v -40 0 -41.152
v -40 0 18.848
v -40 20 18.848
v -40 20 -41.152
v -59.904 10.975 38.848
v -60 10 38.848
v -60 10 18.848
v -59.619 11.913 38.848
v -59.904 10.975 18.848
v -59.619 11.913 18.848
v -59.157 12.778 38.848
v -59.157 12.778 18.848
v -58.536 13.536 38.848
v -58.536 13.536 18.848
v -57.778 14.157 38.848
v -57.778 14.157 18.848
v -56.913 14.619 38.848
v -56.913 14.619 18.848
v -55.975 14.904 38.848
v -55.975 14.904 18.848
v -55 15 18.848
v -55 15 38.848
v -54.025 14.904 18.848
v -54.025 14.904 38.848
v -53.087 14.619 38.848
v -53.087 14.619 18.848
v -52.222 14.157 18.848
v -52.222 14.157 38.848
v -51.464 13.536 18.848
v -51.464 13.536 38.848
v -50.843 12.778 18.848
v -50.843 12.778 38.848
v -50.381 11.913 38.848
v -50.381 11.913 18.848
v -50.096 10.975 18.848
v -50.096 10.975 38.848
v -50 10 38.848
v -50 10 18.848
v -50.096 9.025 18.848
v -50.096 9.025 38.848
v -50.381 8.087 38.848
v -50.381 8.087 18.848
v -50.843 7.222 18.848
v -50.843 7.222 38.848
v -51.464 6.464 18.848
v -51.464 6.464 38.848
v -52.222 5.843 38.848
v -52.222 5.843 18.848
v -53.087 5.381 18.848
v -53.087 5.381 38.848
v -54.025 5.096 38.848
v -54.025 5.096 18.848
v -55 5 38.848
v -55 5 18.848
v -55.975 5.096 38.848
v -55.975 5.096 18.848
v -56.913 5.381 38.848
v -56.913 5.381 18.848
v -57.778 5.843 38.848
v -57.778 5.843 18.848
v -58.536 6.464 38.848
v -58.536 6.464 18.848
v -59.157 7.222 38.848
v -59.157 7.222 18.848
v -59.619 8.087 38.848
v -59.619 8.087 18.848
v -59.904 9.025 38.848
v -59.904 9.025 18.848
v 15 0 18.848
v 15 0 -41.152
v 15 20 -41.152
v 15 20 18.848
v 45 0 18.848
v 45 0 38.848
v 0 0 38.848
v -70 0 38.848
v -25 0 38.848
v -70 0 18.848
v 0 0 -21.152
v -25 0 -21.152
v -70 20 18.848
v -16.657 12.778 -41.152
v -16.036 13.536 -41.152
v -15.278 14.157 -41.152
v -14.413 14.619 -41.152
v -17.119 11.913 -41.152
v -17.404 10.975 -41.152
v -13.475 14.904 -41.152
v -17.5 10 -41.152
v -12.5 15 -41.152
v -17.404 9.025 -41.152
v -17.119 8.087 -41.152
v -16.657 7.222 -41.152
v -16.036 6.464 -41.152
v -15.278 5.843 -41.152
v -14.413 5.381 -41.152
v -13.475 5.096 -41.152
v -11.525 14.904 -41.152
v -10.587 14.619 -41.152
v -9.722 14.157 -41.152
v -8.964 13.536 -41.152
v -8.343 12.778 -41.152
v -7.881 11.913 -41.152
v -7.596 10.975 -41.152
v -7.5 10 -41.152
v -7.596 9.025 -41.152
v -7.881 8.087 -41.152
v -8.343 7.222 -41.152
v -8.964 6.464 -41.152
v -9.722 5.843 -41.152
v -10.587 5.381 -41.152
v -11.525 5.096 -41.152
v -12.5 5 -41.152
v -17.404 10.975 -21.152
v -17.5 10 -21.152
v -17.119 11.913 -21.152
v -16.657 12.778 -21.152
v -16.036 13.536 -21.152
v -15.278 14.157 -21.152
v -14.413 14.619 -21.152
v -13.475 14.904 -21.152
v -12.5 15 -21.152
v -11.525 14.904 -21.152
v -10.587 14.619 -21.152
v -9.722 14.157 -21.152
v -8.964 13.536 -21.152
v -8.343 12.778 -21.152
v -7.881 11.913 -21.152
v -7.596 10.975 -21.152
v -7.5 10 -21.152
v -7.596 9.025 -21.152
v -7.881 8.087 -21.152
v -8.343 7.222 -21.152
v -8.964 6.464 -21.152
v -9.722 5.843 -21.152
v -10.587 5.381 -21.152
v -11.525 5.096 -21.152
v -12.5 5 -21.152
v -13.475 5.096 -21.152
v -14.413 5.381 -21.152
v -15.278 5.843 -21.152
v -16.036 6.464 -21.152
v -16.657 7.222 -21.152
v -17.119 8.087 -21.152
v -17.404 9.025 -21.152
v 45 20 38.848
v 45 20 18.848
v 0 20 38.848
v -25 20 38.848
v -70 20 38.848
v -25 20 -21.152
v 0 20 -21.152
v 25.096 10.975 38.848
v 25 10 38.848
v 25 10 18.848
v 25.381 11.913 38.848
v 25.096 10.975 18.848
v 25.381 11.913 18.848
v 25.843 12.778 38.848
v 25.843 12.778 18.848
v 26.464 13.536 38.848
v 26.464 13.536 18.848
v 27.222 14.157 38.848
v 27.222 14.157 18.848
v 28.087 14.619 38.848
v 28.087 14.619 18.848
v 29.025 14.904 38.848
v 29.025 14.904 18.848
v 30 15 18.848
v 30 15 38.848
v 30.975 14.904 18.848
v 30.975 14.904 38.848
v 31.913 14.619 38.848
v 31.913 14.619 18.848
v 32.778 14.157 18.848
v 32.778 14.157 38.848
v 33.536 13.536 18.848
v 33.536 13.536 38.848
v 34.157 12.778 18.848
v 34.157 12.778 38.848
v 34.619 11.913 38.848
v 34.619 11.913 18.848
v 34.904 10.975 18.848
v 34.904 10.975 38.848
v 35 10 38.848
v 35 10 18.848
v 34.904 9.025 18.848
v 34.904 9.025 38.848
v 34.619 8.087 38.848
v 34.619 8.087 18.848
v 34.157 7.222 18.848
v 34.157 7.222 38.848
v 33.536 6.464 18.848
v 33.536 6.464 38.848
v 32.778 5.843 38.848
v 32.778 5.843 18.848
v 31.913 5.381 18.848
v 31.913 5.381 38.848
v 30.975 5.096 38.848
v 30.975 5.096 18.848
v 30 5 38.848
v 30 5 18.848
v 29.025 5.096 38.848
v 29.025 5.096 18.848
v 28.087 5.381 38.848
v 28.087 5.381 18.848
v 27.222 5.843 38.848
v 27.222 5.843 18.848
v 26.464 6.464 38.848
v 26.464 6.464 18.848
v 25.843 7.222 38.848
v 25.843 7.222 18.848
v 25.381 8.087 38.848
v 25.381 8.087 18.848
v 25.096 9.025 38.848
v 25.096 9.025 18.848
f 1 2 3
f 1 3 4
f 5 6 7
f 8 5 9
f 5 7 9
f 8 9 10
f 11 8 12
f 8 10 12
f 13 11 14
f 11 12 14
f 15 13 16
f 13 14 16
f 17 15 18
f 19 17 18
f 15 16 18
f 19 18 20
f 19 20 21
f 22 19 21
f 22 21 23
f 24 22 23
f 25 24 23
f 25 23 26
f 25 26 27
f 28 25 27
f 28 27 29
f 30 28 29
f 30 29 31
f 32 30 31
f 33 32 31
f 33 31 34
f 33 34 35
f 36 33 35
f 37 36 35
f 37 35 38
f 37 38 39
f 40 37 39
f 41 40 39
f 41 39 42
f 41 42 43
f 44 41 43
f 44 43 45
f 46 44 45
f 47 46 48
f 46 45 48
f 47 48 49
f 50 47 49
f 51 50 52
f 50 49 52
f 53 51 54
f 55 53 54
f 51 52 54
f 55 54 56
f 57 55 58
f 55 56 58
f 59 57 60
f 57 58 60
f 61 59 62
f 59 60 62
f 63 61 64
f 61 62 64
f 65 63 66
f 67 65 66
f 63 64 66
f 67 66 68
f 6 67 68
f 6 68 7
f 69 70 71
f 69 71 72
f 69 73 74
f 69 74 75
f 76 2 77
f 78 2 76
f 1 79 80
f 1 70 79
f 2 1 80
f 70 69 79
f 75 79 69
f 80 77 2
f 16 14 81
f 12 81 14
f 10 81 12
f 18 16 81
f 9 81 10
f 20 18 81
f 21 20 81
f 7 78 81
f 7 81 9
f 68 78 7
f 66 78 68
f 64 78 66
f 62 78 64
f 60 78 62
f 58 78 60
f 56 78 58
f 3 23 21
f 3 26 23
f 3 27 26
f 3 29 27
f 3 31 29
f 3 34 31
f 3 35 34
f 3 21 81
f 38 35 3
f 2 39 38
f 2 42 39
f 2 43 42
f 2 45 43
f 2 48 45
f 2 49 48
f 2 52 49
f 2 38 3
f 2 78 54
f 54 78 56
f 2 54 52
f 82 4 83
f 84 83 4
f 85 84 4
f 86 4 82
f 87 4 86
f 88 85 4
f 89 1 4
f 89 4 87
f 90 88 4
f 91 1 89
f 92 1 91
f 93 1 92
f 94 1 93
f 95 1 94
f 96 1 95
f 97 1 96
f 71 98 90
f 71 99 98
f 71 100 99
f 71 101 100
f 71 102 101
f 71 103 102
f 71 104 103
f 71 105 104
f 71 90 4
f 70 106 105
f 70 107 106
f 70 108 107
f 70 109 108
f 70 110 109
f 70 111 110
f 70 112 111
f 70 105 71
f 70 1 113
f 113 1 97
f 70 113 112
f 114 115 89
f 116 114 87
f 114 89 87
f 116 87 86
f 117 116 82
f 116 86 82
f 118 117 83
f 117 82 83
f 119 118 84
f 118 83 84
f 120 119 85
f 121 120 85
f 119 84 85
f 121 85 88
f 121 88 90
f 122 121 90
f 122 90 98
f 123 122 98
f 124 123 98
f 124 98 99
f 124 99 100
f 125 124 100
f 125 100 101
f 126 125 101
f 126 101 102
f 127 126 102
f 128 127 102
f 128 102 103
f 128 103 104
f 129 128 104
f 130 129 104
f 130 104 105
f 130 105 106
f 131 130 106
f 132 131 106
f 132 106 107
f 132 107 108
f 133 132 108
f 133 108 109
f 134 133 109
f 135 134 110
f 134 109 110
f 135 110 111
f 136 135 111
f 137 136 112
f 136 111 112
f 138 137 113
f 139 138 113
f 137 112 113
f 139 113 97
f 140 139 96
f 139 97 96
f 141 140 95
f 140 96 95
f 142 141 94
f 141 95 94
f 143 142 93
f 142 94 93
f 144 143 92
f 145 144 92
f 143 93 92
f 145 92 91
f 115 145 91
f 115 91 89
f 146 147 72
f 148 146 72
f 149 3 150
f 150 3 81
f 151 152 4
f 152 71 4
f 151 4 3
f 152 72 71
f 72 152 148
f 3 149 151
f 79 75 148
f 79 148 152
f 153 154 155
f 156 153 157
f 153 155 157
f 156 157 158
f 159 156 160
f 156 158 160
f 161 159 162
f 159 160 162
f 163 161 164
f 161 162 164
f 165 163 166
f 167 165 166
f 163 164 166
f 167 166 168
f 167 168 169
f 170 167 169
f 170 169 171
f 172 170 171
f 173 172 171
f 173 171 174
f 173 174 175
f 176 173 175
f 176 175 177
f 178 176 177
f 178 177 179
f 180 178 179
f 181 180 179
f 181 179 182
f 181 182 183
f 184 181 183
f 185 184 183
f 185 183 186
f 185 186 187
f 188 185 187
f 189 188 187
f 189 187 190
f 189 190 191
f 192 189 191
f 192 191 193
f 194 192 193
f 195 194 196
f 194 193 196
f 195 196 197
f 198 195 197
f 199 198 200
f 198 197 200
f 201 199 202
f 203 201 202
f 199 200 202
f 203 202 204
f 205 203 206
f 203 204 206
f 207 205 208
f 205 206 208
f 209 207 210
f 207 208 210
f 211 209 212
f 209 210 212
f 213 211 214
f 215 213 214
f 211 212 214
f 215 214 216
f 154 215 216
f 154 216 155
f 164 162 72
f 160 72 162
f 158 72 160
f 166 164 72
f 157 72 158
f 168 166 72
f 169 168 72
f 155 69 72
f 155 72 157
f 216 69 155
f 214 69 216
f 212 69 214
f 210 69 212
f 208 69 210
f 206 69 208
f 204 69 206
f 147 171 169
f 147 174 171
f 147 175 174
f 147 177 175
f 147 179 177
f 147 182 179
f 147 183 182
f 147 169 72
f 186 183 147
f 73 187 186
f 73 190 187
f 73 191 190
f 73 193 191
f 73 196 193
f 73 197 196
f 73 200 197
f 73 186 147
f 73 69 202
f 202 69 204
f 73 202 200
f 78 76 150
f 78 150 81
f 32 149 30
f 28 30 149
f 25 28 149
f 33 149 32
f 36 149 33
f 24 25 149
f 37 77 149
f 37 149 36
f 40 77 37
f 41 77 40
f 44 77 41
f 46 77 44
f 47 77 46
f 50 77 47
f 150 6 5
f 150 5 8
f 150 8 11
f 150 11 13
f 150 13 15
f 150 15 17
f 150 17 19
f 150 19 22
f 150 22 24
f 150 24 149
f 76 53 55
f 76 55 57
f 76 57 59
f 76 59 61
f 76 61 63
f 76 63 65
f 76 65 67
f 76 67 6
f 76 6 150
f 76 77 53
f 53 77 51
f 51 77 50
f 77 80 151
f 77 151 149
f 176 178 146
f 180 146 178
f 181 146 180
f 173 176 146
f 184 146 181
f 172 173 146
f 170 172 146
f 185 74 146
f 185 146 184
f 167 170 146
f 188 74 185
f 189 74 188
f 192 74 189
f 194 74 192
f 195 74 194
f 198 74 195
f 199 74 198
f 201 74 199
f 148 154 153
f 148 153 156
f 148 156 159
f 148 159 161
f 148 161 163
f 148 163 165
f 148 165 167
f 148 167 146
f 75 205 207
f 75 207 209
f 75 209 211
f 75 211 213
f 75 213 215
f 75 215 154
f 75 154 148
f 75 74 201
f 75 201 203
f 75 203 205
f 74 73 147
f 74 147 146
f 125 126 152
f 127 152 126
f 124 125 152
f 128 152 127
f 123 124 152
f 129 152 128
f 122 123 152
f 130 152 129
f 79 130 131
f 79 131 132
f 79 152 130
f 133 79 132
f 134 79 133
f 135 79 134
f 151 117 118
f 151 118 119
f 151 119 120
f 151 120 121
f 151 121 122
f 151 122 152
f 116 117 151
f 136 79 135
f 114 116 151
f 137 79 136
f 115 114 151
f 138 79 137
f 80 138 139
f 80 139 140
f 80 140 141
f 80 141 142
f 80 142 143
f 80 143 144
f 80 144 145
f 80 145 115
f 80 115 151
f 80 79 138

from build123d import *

# Parameters (mm, degrees)
BOSS_EXTRUDE1_DEPTH              = 20
M10X1_0_TAPPED_HOLE1_D           = 9
M10X1_0_TAPPED_HOLE1_DEPTH       = 23
M10X1_0_TAPPED_HOLE1_CBORE_D     = 10
M10X1_0_TAPPED_HOLE1_CBORE_DEPTH = 20
M10X1_0_TAPPED_HOLE1_TIP         = 2.703872786
M10X1_0_TAPPED_HOLE2_D           = 9
M10X1_0_TAPPED_HOLE2_DEPTH       = 23
M10X1_0_TAPPED_HOLE2_CBORE_D     = 10
M10X1_0_TAPPED_HOLE2_CBORE_DEPTH = 20
M10X1_0_TAPPED_HOLE2_TIP         = 2.703872786


with BuildPart() as part:
    # Sketch1 → Boss-Extrude1 (new body)
    with BuildSketch(Plane(origin=(0, 0, 0), x_dir=(1, 0, 0), z_dir=(0, 1, 0))):
        Polygon((-70, -38.848444635), (-70, -18.848444635), (-40, -18.848444635), (-40, 41.151555365), (15, 41.151555365), (15, -18.848444635), (45, -18.848444635), (45, -38.848444635), (0, -38.848444635), (0, 21.151555365), (-25, 21.151555365), (-25, -38.848444635), align=None)
    extrude(amount=BOSS_EXTRUDE1_DEPTH)

    # M10x1.0 Tapped Hole1
    with Locations(Plane(origin=(-12.5, 10, -41.151555365), x_dir=(-1, 0, 0), z_dir=(0, 0, -1))):
        with Locations((0, 0)):
            CounterBoreHole(M10X1_0_TAPPED_HOLE1_D / 2, M10X1_0_TAPPED_HOLE1_CBORE_D / 2, M10X1_0_TAPPED_HOLE1_CBORE_DEPTH, depth=M10X1_0_TAPPED_HOLE1_DEPTH)
            with Locations((0, 0, -(M10X1_0_TAPPED_HOLE1_DEPTH + M10X1_0_TAPPED_HOLE1_TIP / 2))):  # 118° drill point
                Cone(0, M10X1_0_TAPPED_HOLE1_D / 2, M10X1_0_TAPPED_HOLE1_TIP, mode=Mode.SUBTRACT)

    # M10x1.0 Tapped Hole2
    with Locations(Plane(origin=(30, 10, 18.848444635), x_dir=(-1, 0, 0), z_dir=(0, 0, -1))):
        with Locations((0, 0), (85, 0)):
            CounterBoreHole(M10X1_0_TAPPED_HOLE2_D / 2, M10X1_0_TAPPED_HOLE2_CBORE_D / 2, M10X1_0_TAPPED_HOLE2_CBORE_DEPTH, depth=M10X1_0_TAPPED_HOLE2_DEPTH)
            with Locations((0, 0, -(M10X1_0_TAPPED_HOLE2_DEPTH + M10X1_0_TAPPED_HOLE2_TIP / 2))):  # 118° drill point
                Cone(0, M10X1_0_TAPPED_HOLE2_D / 2, M10X1_0_TAPPED_HOLE2_TIP, mode=Mode.SUBTRACT)


solid = part.part
